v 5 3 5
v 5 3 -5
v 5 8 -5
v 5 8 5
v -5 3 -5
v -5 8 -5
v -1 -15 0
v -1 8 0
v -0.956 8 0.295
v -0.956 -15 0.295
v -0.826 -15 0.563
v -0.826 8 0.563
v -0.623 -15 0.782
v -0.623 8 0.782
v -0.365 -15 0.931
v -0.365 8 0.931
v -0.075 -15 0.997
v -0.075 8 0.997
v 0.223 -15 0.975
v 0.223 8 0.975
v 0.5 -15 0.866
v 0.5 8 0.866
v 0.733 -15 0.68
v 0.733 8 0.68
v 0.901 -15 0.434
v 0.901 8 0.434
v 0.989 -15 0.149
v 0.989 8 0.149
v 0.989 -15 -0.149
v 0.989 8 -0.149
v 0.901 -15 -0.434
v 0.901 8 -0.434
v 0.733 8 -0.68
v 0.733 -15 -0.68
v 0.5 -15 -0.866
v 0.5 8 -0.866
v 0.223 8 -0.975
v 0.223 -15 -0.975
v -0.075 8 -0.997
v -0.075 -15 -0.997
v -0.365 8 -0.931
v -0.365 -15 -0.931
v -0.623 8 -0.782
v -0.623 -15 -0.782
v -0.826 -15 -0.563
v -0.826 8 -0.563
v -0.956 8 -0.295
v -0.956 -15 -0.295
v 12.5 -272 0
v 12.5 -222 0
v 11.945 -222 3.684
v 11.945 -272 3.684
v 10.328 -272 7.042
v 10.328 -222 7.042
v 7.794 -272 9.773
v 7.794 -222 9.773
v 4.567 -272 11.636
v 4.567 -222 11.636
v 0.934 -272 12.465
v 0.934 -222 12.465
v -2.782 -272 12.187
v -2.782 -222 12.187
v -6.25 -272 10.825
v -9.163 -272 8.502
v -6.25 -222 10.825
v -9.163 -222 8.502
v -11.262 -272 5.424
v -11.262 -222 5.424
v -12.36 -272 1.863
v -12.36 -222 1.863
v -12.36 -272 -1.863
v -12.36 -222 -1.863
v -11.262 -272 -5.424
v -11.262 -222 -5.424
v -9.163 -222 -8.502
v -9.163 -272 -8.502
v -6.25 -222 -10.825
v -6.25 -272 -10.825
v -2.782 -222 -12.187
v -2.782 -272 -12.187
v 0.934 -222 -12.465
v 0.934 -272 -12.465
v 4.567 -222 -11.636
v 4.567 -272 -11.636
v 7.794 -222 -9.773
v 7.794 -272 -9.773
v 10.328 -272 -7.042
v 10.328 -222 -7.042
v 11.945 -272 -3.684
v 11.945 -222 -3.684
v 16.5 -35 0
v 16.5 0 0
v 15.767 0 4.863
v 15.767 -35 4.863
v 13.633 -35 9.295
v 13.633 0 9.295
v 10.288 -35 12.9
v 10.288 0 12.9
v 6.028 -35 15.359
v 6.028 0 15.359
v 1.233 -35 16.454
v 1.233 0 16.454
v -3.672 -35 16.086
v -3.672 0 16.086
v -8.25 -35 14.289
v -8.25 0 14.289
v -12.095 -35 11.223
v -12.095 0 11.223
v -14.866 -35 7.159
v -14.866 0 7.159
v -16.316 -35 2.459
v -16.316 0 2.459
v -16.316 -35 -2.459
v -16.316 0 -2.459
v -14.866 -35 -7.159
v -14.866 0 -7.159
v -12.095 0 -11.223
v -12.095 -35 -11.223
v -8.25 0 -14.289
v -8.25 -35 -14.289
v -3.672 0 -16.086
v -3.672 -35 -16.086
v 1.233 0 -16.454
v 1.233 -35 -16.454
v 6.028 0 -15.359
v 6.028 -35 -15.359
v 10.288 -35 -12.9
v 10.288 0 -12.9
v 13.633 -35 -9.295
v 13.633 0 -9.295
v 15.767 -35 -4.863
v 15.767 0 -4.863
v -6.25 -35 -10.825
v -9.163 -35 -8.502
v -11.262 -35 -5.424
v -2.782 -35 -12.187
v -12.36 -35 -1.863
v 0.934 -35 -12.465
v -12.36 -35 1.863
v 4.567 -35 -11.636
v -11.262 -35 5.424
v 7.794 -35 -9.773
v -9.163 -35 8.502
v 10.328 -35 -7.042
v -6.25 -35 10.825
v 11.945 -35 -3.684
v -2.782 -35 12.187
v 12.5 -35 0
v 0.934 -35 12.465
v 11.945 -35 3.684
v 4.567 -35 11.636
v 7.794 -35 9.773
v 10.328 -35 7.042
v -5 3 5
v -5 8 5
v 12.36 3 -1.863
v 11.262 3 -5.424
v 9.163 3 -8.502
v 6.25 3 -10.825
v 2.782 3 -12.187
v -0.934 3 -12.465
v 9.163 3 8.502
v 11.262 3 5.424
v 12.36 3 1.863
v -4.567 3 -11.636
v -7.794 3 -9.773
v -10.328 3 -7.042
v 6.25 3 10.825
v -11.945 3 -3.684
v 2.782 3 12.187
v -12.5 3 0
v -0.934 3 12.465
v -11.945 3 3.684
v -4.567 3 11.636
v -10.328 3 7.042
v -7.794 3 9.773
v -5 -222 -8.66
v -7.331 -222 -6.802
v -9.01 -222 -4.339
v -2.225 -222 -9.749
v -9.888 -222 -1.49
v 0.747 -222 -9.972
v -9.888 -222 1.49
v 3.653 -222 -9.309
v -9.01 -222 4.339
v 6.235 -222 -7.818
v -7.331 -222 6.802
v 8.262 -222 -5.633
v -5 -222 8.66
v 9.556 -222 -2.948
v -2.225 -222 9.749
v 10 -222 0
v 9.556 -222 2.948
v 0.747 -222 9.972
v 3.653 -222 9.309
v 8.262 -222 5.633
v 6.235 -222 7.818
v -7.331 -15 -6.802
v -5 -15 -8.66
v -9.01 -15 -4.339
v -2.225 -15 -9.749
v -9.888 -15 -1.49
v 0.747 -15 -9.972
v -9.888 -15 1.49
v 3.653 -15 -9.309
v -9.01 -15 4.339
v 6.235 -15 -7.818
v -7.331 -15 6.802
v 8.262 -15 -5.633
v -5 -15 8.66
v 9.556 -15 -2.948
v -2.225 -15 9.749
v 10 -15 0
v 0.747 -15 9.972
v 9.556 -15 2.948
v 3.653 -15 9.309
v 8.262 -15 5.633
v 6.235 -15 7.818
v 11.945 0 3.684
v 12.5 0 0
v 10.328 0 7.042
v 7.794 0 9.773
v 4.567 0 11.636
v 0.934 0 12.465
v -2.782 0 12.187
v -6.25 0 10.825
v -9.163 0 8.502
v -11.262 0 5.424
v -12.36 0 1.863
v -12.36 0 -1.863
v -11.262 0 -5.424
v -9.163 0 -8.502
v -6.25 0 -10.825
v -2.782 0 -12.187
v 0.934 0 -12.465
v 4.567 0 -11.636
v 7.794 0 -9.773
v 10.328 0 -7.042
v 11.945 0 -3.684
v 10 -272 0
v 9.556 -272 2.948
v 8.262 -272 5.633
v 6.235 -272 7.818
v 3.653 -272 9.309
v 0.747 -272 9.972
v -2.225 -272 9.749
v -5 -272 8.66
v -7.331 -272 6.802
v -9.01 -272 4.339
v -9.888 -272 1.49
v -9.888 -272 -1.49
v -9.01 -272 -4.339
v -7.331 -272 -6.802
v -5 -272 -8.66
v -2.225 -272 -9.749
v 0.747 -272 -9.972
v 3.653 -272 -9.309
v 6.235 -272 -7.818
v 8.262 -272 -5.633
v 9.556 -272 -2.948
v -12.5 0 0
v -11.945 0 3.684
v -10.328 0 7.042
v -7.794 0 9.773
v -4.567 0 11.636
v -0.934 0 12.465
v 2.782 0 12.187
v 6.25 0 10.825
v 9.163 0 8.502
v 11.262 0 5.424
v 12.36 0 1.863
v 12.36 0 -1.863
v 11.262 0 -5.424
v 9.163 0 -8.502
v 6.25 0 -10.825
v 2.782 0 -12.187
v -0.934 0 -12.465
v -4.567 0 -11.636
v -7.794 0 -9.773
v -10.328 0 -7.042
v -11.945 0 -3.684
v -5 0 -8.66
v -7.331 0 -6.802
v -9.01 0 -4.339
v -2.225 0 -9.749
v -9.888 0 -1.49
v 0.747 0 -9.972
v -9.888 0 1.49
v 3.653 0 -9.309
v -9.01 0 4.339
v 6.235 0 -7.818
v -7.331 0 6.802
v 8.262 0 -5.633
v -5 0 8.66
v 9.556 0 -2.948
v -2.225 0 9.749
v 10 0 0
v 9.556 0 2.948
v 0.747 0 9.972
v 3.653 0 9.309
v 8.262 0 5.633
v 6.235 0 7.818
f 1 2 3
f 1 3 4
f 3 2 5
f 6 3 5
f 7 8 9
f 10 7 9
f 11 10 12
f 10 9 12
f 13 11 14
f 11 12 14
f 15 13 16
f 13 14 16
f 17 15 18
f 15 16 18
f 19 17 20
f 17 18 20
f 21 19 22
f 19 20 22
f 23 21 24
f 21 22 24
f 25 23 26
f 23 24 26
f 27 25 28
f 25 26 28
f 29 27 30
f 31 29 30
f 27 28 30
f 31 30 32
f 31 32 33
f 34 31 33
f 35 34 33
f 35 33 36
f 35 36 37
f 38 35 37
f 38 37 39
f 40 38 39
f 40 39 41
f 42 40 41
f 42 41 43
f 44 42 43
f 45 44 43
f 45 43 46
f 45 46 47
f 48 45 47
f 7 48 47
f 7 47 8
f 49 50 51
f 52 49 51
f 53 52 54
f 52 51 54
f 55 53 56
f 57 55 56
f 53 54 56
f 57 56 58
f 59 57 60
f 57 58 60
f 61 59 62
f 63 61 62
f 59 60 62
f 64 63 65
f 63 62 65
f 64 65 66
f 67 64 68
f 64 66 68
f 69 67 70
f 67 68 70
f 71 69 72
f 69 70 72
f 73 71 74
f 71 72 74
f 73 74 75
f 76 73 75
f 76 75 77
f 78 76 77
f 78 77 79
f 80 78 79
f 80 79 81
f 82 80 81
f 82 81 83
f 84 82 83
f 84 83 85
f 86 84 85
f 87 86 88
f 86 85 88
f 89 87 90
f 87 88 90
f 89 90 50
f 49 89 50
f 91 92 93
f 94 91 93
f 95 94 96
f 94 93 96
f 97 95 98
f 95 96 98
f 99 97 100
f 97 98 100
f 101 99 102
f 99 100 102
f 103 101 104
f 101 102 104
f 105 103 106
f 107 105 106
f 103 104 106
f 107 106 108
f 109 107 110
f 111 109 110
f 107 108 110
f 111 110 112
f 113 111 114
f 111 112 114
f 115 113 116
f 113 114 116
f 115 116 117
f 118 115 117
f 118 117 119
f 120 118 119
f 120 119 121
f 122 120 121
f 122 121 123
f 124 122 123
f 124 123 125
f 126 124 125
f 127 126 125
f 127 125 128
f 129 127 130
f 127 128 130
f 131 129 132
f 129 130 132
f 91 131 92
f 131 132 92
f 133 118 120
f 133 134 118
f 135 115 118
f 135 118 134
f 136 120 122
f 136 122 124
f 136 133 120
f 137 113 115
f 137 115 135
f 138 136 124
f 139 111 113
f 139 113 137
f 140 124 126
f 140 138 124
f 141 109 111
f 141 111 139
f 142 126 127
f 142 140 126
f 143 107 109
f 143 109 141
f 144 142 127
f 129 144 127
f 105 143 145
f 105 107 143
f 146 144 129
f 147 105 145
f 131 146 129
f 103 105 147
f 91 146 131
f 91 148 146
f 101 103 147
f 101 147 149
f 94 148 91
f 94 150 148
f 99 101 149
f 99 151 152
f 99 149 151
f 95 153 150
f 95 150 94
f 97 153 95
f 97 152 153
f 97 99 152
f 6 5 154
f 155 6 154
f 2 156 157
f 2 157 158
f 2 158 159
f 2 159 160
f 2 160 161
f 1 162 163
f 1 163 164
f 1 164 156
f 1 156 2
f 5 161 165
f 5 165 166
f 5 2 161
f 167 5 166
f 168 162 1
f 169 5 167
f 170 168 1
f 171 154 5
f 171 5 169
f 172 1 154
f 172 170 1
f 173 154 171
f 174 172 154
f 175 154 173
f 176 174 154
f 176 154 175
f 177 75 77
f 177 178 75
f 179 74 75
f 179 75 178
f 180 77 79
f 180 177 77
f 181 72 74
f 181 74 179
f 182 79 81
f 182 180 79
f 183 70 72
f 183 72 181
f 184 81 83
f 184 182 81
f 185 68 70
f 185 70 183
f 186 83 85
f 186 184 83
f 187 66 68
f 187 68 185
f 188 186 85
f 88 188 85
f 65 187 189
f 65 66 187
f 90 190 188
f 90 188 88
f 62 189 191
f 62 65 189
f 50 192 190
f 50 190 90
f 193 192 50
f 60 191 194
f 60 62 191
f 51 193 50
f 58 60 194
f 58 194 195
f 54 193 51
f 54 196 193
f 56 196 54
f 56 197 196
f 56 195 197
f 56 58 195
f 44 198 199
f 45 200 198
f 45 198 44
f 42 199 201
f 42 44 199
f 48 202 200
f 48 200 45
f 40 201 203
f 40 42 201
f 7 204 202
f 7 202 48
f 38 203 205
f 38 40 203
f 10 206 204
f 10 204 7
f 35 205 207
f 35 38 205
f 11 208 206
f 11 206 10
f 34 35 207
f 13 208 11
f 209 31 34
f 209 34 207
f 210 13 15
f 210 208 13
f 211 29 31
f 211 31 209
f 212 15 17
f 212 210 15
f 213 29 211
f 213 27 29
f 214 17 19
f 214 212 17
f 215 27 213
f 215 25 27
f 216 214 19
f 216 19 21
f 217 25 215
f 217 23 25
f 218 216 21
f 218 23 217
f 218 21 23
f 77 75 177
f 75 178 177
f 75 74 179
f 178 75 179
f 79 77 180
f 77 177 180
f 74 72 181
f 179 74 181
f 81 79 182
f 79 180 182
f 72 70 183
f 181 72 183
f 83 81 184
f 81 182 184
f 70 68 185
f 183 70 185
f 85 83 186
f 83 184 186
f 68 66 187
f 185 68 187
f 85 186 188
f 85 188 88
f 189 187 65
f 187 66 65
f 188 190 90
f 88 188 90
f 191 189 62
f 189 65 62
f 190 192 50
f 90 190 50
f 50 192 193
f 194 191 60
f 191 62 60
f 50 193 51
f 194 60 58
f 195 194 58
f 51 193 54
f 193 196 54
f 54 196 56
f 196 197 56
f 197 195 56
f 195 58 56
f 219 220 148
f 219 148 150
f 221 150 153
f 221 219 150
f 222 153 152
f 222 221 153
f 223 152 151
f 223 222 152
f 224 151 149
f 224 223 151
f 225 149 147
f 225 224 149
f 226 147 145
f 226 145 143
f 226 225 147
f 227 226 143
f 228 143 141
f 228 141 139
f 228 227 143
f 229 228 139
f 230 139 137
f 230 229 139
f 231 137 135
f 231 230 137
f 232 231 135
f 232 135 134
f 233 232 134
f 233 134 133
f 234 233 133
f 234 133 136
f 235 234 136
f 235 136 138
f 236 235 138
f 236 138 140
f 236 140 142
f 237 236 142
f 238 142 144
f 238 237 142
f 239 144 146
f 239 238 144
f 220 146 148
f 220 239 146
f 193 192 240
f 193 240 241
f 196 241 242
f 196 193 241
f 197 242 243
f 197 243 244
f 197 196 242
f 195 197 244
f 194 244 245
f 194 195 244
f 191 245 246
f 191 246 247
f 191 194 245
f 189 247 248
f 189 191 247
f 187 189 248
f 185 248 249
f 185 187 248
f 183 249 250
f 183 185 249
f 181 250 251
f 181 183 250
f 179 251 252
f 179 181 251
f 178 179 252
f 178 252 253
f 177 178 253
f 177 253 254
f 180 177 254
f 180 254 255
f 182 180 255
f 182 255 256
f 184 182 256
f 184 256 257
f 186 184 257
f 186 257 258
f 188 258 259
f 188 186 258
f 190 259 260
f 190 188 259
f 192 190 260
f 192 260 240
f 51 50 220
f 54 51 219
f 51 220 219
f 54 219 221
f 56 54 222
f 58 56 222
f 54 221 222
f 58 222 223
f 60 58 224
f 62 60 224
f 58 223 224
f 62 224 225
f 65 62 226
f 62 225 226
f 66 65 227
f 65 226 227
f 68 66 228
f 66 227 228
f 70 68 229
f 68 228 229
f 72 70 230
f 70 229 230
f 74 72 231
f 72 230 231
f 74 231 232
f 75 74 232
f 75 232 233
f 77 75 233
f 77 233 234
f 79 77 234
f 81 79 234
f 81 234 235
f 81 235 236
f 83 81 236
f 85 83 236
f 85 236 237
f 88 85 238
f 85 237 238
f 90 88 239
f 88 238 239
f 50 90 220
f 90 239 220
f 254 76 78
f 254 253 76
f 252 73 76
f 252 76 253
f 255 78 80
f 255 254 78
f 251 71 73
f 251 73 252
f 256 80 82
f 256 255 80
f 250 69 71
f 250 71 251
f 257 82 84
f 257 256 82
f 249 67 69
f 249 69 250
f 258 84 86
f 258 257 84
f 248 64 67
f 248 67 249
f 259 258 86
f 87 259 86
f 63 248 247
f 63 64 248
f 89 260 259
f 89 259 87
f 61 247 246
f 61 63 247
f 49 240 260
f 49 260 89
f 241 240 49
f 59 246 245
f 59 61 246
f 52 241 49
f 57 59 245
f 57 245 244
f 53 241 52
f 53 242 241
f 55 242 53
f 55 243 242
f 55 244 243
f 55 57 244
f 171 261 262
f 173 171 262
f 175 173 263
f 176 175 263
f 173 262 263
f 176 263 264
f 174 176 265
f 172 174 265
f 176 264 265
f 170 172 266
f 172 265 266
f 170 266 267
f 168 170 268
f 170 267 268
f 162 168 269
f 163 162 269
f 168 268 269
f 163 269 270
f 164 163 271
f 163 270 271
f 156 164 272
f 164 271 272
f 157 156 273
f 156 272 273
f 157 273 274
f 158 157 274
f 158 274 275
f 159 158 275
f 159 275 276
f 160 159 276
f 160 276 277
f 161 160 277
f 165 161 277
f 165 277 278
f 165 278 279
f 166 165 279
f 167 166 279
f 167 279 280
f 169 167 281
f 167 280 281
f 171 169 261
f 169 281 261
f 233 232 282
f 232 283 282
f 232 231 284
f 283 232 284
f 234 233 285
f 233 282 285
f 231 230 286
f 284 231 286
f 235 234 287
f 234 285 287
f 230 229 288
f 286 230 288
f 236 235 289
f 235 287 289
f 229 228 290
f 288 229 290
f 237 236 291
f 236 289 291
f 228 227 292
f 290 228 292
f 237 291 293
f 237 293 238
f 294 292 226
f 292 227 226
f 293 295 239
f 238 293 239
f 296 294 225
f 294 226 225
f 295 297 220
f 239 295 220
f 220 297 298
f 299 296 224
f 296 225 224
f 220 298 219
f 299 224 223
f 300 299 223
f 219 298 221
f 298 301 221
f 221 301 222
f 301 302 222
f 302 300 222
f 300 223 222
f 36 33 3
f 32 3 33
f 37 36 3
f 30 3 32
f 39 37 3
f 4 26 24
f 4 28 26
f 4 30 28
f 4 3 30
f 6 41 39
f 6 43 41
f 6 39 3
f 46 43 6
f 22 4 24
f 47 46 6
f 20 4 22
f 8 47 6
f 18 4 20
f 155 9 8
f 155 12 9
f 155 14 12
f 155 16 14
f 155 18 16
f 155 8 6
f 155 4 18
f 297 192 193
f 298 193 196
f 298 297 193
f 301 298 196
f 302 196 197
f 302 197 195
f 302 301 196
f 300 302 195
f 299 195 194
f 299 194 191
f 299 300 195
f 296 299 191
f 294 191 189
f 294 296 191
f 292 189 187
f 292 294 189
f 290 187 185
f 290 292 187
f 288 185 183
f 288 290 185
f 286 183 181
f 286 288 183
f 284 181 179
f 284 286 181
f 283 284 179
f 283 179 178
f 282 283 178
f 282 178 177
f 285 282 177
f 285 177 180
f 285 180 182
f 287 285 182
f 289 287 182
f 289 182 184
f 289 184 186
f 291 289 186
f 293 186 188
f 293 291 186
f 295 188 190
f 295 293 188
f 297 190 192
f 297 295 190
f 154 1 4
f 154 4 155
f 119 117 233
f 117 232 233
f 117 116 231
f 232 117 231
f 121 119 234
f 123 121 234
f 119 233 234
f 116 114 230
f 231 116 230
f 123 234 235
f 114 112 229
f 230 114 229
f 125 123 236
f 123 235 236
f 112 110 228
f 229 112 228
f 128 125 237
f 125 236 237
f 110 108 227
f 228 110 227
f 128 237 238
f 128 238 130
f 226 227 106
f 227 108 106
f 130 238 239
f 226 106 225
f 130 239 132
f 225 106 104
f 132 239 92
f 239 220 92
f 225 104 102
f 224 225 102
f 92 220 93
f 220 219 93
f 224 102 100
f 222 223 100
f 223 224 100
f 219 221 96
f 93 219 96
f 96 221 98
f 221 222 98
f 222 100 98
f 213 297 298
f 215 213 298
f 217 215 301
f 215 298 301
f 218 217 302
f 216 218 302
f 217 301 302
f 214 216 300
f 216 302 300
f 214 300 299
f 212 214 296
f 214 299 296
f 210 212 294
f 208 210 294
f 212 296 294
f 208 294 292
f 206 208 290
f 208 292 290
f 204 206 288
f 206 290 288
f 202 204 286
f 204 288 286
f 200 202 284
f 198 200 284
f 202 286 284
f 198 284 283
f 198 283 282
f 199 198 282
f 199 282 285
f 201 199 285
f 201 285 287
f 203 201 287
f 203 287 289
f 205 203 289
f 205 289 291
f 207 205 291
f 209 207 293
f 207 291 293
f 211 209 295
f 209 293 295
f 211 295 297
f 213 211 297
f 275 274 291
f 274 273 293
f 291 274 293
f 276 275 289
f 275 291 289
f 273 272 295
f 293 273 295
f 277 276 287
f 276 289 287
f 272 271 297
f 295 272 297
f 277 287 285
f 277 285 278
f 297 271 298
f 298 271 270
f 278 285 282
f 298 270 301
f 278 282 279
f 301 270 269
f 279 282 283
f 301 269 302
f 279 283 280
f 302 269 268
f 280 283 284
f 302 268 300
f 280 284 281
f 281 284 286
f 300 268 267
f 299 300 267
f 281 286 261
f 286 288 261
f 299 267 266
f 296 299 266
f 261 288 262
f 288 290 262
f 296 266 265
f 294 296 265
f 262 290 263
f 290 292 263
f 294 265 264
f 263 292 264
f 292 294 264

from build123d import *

# Parameters (mm, degrees)
F0_R      = 12.5
F0_R_2    = 10
F1_DEPTH  = 222
F2_DEPTH  = 50
F3_R      = 16.5
F3_R_2    = 12.5
F4_DEPTH  = 35
F5_R      = 10
F6_DEPTH  = 15
F7_R      = 12.5
F8_DEPTH  = 3
F9_W      = 10
F9_H      = 10
F10_DEPTH = 5
F11_R     = 1
F12_DEPTH = 25


with BuildPart() as f1:
    # F0 (on Front) → F1 (new body)
    with BuildSketch(Plane.XZ):
        Circle(F0_R)
        Circle(F0_R_2, mode=Mode.SUBTRACT)
    extrude(amount=F1_DEPTH)


with BuildPart() as f2:
    # F2 (new): a face of the model
    f2_faces = [f1.part.faces().sort_by_distance(p)[0] for p in [
        (-12.1464466094, -222, 0),
    ]]
    extrude(f2_faces, amount=F2_DEPTH)


with BuildPart() as f4:
    # F3 (on Front) → F4 (new body)
    with BuildSketch(Plane.XZ):
        Circle(F3_R)
        Circle(F3_R_2, mode=Mode.SUBTRACT)
    extrude(amount=F4_DEPTH)


with BuildPart() as f6:
    # F5 (on Front) → F6 (new body)
    with BuildSketch(Plane.XZ):
        Circle(F5_R)
    extrude(amount=F6_DEPTH)

    # F7 (on face) → F8 (join)
    with BuildSketch(Plane(origin=(0, 0, 0), x_dir=(-1, 0, 0), z_dir=(0, 1, 0))):
        Circle(F7_R)
    extrude(amount=F8_DEPTH)

    # F9 (on face) → F10 (join)
    with BuildSketch(Plane(origin=(0, 3, 0), x_dir=(-1, 0, 0), z_dir=(0, 1, 0))):
        Rectangle(F9_W, F9_H)
    extrude(amount=F10_DEPTH)

    # F11 (on face) → F12 (cut)
    with BuildSketch(Plane(origin=(0, 8, 0), x_dir=(-1, 0, 0), z_dir=(0, 1, 0))):
        Circle(F11_R)
    extrude(amount=-F12_DEPTH, mode=Mode.SUBTRACT)


solid = Compound([f1.part, f2.part, f4.part, f6.part])
